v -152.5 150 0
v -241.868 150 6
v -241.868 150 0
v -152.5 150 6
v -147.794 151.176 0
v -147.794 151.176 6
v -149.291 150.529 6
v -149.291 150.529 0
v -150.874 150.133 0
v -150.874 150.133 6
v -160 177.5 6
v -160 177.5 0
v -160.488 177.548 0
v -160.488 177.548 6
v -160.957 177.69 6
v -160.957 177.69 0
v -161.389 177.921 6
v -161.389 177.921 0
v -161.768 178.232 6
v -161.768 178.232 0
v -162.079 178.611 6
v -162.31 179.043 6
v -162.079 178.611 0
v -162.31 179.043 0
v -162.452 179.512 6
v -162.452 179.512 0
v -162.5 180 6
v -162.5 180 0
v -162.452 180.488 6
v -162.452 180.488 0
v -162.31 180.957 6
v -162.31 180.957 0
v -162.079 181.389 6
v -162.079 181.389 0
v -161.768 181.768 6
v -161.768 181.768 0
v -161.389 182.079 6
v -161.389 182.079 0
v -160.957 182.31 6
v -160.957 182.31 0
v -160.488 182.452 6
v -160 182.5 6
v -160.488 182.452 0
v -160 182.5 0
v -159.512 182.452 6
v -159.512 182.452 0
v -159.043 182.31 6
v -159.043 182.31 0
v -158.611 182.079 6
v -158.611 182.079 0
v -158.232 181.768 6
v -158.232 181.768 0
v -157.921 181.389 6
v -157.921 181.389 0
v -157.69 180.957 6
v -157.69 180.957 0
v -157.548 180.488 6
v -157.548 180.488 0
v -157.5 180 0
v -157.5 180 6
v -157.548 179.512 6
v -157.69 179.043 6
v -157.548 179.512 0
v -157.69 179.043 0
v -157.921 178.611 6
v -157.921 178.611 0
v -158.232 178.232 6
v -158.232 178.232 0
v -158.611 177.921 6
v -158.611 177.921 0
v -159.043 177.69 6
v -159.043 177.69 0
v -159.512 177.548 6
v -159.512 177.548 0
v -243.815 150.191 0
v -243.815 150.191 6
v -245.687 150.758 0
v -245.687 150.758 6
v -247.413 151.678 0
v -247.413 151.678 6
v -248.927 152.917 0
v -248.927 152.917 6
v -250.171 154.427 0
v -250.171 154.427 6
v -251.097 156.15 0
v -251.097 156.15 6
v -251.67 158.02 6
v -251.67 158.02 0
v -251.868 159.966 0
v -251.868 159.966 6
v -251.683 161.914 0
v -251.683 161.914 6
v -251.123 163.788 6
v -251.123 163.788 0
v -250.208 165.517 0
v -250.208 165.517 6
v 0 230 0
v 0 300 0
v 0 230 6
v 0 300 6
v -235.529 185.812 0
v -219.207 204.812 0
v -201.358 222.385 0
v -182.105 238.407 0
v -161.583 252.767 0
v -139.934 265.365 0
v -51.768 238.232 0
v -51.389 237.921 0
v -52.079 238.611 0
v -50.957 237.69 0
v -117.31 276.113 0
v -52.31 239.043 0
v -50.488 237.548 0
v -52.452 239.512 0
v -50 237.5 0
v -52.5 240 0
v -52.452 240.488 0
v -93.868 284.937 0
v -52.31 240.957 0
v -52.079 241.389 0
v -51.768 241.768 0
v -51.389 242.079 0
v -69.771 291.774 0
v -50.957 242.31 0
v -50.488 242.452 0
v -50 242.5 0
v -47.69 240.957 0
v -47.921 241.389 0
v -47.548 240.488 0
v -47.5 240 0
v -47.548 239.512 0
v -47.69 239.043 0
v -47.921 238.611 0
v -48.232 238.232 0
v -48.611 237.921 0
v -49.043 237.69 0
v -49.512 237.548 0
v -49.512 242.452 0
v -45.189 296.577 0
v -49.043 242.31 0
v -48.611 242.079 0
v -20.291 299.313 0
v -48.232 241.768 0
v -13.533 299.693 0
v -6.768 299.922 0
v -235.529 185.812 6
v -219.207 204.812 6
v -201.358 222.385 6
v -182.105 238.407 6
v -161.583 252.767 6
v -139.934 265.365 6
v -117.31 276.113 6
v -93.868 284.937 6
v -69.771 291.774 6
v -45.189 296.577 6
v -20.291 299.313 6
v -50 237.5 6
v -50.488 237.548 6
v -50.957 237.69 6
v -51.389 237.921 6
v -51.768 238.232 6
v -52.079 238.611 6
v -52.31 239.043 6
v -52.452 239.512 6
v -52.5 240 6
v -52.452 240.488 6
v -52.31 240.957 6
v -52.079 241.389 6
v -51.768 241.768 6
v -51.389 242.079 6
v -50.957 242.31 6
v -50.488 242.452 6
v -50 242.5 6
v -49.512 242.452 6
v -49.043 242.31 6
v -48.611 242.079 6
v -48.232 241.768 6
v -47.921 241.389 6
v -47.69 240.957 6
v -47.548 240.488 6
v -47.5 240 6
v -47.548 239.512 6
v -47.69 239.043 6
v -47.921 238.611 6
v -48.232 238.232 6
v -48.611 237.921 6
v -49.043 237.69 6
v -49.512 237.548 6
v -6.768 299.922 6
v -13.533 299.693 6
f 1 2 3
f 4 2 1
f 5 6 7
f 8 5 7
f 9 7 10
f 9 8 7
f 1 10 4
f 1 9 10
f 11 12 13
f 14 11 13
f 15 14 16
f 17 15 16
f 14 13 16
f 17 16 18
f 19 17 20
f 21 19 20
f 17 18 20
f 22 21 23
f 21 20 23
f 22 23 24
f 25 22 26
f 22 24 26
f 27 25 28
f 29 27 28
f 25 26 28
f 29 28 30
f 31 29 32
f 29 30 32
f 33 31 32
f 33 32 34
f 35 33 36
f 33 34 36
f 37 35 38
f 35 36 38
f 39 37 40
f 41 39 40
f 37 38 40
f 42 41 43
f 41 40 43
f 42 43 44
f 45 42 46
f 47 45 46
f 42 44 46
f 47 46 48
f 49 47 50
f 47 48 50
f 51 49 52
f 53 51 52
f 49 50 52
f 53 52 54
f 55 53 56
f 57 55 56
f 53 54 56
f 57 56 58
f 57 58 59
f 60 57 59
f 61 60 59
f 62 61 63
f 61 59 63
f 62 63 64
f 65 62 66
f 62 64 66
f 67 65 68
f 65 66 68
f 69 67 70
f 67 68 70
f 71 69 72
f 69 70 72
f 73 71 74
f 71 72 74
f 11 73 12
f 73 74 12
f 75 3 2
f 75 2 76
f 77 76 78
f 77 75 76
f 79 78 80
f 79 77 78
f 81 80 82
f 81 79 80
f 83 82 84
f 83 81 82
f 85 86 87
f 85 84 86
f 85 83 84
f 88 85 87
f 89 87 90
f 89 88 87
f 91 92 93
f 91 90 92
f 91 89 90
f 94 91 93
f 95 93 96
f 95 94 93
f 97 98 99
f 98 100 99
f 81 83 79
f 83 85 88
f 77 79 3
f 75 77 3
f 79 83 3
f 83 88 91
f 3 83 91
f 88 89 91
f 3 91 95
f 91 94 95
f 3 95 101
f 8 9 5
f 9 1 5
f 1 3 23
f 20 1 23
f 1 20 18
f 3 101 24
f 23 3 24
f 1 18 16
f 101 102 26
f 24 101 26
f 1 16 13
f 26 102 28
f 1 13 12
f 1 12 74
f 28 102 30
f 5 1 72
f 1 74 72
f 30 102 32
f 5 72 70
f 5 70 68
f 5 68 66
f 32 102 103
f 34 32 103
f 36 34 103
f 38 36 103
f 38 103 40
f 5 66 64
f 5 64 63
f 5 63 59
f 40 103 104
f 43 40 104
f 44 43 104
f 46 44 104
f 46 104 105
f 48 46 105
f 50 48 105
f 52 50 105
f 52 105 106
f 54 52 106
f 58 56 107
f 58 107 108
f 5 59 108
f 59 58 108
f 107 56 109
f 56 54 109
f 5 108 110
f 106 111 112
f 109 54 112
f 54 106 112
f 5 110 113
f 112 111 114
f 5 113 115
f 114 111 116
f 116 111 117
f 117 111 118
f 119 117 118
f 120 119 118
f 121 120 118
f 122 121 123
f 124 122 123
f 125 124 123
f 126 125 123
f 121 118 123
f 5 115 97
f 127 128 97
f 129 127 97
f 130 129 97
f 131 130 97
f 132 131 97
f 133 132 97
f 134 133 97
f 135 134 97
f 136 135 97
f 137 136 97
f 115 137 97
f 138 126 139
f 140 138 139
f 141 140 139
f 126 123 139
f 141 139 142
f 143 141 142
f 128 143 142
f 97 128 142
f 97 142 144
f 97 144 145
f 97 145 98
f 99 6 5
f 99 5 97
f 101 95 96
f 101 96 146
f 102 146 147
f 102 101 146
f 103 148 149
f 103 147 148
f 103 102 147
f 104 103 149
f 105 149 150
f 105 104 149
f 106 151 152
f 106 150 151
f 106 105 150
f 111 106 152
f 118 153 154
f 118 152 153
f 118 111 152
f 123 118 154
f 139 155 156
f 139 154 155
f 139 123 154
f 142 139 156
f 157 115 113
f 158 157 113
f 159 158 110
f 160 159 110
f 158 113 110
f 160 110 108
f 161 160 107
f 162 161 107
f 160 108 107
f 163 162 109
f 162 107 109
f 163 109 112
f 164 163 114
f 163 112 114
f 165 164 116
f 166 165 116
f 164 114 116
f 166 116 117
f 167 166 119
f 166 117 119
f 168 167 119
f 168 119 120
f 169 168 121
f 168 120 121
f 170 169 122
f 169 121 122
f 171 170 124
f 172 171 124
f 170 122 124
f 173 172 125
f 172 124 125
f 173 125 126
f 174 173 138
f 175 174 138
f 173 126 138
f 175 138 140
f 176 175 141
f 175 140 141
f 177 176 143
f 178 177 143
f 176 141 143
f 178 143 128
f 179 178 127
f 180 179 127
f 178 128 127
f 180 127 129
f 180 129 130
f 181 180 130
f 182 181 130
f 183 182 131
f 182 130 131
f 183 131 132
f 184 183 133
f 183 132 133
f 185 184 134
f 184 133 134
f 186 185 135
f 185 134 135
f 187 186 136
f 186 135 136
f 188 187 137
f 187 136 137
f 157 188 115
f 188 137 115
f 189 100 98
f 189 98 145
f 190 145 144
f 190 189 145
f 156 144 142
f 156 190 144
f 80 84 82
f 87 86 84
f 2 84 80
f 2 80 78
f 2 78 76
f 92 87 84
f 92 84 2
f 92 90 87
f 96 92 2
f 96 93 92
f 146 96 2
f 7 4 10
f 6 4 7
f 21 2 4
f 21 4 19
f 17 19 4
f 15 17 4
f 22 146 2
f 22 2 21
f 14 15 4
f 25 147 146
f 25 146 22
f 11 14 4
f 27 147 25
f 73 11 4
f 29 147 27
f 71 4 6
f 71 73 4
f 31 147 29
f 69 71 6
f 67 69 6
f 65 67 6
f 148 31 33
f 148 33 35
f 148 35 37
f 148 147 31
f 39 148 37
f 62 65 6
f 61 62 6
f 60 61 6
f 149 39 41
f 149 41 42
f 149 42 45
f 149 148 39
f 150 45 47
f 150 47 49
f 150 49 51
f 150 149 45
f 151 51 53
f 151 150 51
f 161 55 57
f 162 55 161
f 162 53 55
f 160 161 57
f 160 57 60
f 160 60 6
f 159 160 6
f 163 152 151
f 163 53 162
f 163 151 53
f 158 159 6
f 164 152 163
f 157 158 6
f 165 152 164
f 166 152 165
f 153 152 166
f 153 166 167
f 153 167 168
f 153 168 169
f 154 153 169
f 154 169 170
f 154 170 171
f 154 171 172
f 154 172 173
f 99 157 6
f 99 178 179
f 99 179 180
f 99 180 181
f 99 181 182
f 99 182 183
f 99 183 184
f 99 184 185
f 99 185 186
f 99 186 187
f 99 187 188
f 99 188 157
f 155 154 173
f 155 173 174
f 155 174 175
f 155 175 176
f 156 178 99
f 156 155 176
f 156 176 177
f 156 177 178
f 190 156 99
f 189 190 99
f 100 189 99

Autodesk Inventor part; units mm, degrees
ref_plane "YZ Plane" through (0, 0, 0) normal (1, 0, 0) x (0, 1, 0)
ref_plane "XZ Plane" through (0, 0, 0) normal (0, 1, 0) x (-1, 0, 0)
ref_plane "XY Plane" through (0, 0, 0) normal (0, 0, 1) x (1, 0, 0)
sketch "Sketch1" plane through (0, 0, 0) normal (0, 0, 1) x (1, 0, 0)
  circle A0 centre (0, 0) radius 300
  dimension "d0" = 600
extrude "Extrusion1" add sketch "Sketch1" along normal blind 6
sketch "Sketch2" plane through (0, 0, 6) normal (0, 0, 1) x (1, 0, 0)
  line L0 (-170, -250) -> (170, -250)
  line L1 (170, -250) -> (170, 250)
  line L2 (170, 250) -> (-170, 250)
  line L3 (-170, 250) -> (-170, -250)
  line L4 (-170, -250) -> (170, 250) construction
  line L5 (170, -250) -> (-170, 250) construction
  line L6 (-150, 230) -> (150, 230)
  line L7 (150, 230) -> (150, -230)
  line L8 (150, -230) -> (-150, -230)
  line L9 (-150, -230) -> (-150, 230)
  point P0 (0, 0)
  dimension "d3" = 340
  dimension "d4" = 500
  dimension "d5" = 20
sketch "Sketch3" plane through (0, 0, 6) normal (0, 0, 1) x (1, 0, 0)
  line L0 (0, 0) -> (-261.0308, 150.7062)
  line L1 (0, 0) -> (261.1835, 150.7944)
  line L2 (0, 0) -> (299.5929, 0) construction
  arc A0 (261.1835, 150.7944) -> (-261.0308, 150.7062) centre (0.1023, -3.0238) ccw
  dimension "d6" = 120
  dimension "d7" = 30
extrude "Extrusion2" cut sketch "Sketch3" along normal through all both and the other way through all keep common part
sketch "Sketch4" plane through (0, 0, 6) normal (0, 0, 1) x (1, 0, 0)
  arc A0 (-20.2802, 299.3137) -> (-259.8076, 150) centre (0, 0) ccw projected
  line L0 (259.8076, 150) -> (0, 0) projected
  line L1 (-259.8076, 150) -> (259.8076, 150)
  line L2 (259.8076, 150) -> (0, 0)
  line L3 (0, 0) -> (-259.8076, 150)
extrude "Extrusion3" cut sketch "Sketch4" against normal through all
sketch "Sketch5" plane through (0, 0, 6) normal (0, 0, 1) x (1, 0, 0)
  line L0 (-259.8076, 150) -> (259.8076, 150) projected
  arc A0 (259.8076, 150) -> (0, 300) centre (0, 0) ccw projected
  arc A1 (0, 300) -> (-20.2802, 299.3137) centre (0.1023, -3.0238) ccw projected
  arc A2 (-20.2802, 299.3137) -> (-259.8076, 150) centre (0, 0) ccw projected
  line L1 (-150, 230) -> (150, 230) projected
  line L2 (-150, -230) -> (-150, 230) projected
  line L3 (170, 250) -> (-170, 250) projected
  line L4 (-170, 250) -> (-170, -250) projected
  line L5 (-259.8076, 150) -> (259.8076, 150) projected
  line L6 (-150, 150) -> (0, 230)
  line L7 (0, 300) -> (0, 230)
extrude "Extrusion4" cut sketch "Sketch5" against normal through all contours L6 L7 L3 A0 L0 | L3 L7 A0
fillet "Fillet1" radius 10 2 edges at (-259.8076, 150, 3) (-150, 150, 3)
sketch "Sketch6" plane through (0, 0, 6) normal (0, 0, 1) x (1, 0, 0)
  line L0 (0, 230) -> (0, 300) projected
  line L1 (170, 250) -> (-170, 250) projected
  line L2 (-170, 250) -> (-170, -250) projected
  point P0 (0, 0)
  point P1 (-160, 180)
  point P2 (-50, 240)
  dimension "d15" = 50
  dimension "d16" = 70
  dimension "d17" = 10
  dimension "d18" = 10
hole "Hole1" at (-160, 180, 6) at (-50, 240, 6) direction (0, 0, -1) diameter 5 end through all
properties part number "beltMount"
